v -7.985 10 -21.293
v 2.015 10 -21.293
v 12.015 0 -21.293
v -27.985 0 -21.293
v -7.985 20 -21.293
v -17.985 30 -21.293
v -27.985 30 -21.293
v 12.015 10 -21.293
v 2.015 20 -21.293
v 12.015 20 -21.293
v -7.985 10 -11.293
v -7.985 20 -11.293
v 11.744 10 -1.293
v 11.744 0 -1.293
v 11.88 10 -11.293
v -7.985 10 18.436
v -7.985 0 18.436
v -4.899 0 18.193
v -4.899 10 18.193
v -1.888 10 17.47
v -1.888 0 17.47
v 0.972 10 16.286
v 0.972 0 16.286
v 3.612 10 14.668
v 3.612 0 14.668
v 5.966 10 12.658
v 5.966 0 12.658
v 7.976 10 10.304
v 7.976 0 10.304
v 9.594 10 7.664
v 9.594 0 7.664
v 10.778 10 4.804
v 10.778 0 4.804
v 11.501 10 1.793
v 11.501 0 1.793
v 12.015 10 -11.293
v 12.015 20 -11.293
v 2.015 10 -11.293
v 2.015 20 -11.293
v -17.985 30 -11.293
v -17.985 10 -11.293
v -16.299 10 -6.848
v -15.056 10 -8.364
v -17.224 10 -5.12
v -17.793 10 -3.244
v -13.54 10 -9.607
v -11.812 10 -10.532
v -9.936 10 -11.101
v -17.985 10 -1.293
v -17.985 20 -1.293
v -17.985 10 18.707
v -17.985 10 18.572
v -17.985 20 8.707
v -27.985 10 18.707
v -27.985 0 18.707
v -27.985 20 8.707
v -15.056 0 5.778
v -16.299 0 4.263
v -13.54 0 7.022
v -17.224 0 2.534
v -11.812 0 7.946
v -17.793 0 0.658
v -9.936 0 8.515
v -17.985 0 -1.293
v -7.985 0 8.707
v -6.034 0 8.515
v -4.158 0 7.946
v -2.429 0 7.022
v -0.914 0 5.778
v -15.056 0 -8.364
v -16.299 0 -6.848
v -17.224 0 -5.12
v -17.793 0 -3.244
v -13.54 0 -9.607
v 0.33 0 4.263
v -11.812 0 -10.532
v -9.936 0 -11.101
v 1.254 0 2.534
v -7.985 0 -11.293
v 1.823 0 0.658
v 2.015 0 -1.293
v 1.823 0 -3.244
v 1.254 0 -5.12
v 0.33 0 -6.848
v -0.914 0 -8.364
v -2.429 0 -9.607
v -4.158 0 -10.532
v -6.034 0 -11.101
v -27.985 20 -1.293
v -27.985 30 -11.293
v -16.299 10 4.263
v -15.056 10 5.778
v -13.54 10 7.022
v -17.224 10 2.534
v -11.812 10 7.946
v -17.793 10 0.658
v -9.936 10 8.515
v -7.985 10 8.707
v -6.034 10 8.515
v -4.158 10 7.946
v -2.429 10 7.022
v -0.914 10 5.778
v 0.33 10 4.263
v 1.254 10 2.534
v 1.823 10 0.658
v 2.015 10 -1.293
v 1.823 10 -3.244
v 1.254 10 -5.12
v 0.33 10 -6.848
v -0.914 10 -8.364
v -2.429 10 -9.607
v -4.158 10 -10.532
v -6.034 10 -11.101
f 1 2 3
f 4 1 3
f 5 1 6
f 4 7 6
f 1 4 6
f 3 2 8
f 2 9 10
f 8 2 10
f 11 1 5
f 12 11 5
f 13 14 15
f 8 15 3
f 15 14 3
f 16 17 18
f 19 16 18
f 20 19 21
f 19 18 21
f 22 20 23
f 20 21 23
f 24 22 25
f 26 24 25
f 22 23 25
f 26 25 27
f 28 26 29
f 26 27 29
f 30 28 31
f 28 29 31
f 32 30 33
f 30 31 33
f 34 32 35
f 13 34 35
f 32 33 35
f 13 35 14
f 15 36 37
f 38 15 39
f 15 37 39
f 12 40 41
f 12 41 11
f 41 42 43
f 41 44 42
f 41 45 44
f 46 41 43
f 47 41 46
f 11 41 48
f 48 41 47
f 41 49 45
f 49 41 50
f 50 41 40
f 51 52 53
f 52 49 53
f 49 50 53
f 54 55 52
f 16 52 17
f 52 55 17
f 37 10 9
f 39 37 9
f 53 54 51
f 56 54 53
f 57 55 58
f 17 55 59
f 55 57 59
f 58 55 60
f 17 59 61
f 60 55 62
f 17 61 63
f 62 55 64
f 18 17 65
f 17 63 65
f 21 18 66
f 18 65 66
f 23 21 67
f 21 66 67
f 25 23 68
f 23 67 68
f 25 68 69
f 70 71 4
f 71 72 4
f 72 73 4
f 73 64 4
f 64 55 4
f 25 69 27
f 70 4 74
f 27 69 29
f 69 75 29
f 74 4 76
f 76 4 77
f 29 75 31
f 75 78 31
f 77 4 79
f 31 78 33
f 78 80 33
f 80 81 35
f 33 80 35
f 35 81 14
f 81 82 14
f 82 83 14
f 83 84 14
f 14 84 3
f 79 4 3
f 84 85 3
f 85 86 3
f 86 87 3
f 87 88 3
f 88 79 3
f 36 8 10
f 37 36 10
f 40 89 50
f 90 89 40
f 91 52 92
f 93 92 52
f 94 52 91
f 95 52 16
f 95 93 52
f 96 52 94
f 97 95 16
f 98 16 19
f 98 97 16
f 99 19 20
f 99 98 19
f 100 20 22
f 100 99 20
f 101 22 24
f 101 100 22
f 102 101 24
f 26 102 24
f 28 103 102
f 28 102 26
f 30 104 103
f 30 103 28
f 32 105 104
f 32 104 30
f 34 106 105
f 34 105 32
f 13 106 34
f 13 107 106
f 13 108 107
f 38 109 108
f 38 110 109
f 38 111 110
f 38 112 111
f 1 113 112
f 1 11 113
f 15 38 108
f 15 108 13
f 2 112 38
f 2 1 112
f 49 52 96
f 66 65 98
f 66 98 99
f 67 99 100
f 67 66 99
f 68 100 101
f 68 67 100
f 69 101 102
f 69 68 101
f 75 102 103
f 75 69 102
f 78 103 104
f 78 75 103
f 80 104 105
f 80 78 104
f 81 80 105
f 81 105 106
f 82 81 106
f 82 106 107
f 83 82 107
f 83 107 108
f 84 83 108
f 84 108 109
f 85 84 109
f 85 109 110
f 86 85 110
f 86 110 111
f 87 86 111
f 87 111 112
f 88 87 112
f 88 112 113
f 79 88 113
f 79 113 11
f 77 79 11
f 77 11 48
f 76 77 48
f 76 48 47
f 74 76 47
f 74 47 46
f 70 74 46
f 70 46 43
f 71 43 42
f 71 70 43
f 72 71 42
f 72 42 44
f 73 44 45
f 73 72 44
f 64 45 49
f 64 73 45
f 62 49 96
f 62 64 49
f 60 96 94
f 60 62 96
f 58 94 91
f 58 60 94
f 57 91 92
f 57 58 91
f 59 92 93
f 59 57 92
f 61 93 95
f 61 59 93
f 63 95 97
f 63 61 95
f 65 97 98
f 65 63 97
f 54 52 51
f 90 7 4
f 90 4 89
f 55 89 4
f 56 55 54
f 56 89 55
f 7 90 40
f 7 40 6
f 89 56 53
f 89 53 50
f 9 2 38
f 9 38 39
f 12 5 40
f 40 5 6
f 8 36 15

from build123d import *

# Parameters (mm, degrees)
SKETCH1_R           = 10
BOSS_EXTRUDE1_DEPTH = 10
BOSS_EXTRUDE2_DEPTH = 10
SKETCH3_W           = 10
SKETCH3_H           = 10
BOSS_EXTRUDE3_DEPTH = 10


with BuildPart() as part:
    # Sketch1 → Boss-Extrude1 (new body)
    with BuildSketch(Plane(origin=(0, 0, 0), x_dir=(1, 0, 0), z_dir=(0, 1, 0))):
        with BuildLine():
            Line((-27.984790875, 21.292775665), (-27.984790875, -18.707224335))
            Line((-27.984790875, -18.707224335), (-7.984790875, -18.436045575))
            ThreePointArc((-7.984790875, -18.436045575), (5.96559241, -12.657607619), (11.744030366, 1.292775665))
            Line((11.744030366, 1.292775665), (12.015209125, 21.292775665))
            Line((12.015209125, 21.292775665), (-27.984790875, 21.292775665))
        make_face()
        with Locations(Location((-7.984790875, 1.292775665, 0), (0, 0, 270))):
            Circle(SKETCH1_R, mode=Mode.SUBTRACT)
    extrude(amount=BOSS_EXTRUDE1_DEPTH)

    # Sketch2 → Boss-Extrude2 (add)
    with BuildSketch(Plane.ZY.offset(27.984790875)):
        Polygon((18.707224335, 10), (8.707224335, 20), (-1.292775665, 20), (-11.292775665, 30), (-21.292775665, 30), (-21.292775665, 10), align=None)
    extrude(amount=-BOSS_EXTRUDE2_DEPTH)

    # Sketch3 → Boss-Extrude3 (add)
    with BuildSketch(Plane(origin=(0, 0, -21.292775665), x_dir=(-1, 0, 0), z_dir=(0, 0, -1))):
        Polygon((17.984790875, 30), (17.984790875, 10), (7.984790875, 10), (7.984790875, 20), align=None)
        with Locations((-7.015209125, 15)):
            Rectangle(SKETCH3_W, SKETCH3_H)
    extrude(amount=-BOSS_EXTRUDE3_DEPTH)


solid = part.part
